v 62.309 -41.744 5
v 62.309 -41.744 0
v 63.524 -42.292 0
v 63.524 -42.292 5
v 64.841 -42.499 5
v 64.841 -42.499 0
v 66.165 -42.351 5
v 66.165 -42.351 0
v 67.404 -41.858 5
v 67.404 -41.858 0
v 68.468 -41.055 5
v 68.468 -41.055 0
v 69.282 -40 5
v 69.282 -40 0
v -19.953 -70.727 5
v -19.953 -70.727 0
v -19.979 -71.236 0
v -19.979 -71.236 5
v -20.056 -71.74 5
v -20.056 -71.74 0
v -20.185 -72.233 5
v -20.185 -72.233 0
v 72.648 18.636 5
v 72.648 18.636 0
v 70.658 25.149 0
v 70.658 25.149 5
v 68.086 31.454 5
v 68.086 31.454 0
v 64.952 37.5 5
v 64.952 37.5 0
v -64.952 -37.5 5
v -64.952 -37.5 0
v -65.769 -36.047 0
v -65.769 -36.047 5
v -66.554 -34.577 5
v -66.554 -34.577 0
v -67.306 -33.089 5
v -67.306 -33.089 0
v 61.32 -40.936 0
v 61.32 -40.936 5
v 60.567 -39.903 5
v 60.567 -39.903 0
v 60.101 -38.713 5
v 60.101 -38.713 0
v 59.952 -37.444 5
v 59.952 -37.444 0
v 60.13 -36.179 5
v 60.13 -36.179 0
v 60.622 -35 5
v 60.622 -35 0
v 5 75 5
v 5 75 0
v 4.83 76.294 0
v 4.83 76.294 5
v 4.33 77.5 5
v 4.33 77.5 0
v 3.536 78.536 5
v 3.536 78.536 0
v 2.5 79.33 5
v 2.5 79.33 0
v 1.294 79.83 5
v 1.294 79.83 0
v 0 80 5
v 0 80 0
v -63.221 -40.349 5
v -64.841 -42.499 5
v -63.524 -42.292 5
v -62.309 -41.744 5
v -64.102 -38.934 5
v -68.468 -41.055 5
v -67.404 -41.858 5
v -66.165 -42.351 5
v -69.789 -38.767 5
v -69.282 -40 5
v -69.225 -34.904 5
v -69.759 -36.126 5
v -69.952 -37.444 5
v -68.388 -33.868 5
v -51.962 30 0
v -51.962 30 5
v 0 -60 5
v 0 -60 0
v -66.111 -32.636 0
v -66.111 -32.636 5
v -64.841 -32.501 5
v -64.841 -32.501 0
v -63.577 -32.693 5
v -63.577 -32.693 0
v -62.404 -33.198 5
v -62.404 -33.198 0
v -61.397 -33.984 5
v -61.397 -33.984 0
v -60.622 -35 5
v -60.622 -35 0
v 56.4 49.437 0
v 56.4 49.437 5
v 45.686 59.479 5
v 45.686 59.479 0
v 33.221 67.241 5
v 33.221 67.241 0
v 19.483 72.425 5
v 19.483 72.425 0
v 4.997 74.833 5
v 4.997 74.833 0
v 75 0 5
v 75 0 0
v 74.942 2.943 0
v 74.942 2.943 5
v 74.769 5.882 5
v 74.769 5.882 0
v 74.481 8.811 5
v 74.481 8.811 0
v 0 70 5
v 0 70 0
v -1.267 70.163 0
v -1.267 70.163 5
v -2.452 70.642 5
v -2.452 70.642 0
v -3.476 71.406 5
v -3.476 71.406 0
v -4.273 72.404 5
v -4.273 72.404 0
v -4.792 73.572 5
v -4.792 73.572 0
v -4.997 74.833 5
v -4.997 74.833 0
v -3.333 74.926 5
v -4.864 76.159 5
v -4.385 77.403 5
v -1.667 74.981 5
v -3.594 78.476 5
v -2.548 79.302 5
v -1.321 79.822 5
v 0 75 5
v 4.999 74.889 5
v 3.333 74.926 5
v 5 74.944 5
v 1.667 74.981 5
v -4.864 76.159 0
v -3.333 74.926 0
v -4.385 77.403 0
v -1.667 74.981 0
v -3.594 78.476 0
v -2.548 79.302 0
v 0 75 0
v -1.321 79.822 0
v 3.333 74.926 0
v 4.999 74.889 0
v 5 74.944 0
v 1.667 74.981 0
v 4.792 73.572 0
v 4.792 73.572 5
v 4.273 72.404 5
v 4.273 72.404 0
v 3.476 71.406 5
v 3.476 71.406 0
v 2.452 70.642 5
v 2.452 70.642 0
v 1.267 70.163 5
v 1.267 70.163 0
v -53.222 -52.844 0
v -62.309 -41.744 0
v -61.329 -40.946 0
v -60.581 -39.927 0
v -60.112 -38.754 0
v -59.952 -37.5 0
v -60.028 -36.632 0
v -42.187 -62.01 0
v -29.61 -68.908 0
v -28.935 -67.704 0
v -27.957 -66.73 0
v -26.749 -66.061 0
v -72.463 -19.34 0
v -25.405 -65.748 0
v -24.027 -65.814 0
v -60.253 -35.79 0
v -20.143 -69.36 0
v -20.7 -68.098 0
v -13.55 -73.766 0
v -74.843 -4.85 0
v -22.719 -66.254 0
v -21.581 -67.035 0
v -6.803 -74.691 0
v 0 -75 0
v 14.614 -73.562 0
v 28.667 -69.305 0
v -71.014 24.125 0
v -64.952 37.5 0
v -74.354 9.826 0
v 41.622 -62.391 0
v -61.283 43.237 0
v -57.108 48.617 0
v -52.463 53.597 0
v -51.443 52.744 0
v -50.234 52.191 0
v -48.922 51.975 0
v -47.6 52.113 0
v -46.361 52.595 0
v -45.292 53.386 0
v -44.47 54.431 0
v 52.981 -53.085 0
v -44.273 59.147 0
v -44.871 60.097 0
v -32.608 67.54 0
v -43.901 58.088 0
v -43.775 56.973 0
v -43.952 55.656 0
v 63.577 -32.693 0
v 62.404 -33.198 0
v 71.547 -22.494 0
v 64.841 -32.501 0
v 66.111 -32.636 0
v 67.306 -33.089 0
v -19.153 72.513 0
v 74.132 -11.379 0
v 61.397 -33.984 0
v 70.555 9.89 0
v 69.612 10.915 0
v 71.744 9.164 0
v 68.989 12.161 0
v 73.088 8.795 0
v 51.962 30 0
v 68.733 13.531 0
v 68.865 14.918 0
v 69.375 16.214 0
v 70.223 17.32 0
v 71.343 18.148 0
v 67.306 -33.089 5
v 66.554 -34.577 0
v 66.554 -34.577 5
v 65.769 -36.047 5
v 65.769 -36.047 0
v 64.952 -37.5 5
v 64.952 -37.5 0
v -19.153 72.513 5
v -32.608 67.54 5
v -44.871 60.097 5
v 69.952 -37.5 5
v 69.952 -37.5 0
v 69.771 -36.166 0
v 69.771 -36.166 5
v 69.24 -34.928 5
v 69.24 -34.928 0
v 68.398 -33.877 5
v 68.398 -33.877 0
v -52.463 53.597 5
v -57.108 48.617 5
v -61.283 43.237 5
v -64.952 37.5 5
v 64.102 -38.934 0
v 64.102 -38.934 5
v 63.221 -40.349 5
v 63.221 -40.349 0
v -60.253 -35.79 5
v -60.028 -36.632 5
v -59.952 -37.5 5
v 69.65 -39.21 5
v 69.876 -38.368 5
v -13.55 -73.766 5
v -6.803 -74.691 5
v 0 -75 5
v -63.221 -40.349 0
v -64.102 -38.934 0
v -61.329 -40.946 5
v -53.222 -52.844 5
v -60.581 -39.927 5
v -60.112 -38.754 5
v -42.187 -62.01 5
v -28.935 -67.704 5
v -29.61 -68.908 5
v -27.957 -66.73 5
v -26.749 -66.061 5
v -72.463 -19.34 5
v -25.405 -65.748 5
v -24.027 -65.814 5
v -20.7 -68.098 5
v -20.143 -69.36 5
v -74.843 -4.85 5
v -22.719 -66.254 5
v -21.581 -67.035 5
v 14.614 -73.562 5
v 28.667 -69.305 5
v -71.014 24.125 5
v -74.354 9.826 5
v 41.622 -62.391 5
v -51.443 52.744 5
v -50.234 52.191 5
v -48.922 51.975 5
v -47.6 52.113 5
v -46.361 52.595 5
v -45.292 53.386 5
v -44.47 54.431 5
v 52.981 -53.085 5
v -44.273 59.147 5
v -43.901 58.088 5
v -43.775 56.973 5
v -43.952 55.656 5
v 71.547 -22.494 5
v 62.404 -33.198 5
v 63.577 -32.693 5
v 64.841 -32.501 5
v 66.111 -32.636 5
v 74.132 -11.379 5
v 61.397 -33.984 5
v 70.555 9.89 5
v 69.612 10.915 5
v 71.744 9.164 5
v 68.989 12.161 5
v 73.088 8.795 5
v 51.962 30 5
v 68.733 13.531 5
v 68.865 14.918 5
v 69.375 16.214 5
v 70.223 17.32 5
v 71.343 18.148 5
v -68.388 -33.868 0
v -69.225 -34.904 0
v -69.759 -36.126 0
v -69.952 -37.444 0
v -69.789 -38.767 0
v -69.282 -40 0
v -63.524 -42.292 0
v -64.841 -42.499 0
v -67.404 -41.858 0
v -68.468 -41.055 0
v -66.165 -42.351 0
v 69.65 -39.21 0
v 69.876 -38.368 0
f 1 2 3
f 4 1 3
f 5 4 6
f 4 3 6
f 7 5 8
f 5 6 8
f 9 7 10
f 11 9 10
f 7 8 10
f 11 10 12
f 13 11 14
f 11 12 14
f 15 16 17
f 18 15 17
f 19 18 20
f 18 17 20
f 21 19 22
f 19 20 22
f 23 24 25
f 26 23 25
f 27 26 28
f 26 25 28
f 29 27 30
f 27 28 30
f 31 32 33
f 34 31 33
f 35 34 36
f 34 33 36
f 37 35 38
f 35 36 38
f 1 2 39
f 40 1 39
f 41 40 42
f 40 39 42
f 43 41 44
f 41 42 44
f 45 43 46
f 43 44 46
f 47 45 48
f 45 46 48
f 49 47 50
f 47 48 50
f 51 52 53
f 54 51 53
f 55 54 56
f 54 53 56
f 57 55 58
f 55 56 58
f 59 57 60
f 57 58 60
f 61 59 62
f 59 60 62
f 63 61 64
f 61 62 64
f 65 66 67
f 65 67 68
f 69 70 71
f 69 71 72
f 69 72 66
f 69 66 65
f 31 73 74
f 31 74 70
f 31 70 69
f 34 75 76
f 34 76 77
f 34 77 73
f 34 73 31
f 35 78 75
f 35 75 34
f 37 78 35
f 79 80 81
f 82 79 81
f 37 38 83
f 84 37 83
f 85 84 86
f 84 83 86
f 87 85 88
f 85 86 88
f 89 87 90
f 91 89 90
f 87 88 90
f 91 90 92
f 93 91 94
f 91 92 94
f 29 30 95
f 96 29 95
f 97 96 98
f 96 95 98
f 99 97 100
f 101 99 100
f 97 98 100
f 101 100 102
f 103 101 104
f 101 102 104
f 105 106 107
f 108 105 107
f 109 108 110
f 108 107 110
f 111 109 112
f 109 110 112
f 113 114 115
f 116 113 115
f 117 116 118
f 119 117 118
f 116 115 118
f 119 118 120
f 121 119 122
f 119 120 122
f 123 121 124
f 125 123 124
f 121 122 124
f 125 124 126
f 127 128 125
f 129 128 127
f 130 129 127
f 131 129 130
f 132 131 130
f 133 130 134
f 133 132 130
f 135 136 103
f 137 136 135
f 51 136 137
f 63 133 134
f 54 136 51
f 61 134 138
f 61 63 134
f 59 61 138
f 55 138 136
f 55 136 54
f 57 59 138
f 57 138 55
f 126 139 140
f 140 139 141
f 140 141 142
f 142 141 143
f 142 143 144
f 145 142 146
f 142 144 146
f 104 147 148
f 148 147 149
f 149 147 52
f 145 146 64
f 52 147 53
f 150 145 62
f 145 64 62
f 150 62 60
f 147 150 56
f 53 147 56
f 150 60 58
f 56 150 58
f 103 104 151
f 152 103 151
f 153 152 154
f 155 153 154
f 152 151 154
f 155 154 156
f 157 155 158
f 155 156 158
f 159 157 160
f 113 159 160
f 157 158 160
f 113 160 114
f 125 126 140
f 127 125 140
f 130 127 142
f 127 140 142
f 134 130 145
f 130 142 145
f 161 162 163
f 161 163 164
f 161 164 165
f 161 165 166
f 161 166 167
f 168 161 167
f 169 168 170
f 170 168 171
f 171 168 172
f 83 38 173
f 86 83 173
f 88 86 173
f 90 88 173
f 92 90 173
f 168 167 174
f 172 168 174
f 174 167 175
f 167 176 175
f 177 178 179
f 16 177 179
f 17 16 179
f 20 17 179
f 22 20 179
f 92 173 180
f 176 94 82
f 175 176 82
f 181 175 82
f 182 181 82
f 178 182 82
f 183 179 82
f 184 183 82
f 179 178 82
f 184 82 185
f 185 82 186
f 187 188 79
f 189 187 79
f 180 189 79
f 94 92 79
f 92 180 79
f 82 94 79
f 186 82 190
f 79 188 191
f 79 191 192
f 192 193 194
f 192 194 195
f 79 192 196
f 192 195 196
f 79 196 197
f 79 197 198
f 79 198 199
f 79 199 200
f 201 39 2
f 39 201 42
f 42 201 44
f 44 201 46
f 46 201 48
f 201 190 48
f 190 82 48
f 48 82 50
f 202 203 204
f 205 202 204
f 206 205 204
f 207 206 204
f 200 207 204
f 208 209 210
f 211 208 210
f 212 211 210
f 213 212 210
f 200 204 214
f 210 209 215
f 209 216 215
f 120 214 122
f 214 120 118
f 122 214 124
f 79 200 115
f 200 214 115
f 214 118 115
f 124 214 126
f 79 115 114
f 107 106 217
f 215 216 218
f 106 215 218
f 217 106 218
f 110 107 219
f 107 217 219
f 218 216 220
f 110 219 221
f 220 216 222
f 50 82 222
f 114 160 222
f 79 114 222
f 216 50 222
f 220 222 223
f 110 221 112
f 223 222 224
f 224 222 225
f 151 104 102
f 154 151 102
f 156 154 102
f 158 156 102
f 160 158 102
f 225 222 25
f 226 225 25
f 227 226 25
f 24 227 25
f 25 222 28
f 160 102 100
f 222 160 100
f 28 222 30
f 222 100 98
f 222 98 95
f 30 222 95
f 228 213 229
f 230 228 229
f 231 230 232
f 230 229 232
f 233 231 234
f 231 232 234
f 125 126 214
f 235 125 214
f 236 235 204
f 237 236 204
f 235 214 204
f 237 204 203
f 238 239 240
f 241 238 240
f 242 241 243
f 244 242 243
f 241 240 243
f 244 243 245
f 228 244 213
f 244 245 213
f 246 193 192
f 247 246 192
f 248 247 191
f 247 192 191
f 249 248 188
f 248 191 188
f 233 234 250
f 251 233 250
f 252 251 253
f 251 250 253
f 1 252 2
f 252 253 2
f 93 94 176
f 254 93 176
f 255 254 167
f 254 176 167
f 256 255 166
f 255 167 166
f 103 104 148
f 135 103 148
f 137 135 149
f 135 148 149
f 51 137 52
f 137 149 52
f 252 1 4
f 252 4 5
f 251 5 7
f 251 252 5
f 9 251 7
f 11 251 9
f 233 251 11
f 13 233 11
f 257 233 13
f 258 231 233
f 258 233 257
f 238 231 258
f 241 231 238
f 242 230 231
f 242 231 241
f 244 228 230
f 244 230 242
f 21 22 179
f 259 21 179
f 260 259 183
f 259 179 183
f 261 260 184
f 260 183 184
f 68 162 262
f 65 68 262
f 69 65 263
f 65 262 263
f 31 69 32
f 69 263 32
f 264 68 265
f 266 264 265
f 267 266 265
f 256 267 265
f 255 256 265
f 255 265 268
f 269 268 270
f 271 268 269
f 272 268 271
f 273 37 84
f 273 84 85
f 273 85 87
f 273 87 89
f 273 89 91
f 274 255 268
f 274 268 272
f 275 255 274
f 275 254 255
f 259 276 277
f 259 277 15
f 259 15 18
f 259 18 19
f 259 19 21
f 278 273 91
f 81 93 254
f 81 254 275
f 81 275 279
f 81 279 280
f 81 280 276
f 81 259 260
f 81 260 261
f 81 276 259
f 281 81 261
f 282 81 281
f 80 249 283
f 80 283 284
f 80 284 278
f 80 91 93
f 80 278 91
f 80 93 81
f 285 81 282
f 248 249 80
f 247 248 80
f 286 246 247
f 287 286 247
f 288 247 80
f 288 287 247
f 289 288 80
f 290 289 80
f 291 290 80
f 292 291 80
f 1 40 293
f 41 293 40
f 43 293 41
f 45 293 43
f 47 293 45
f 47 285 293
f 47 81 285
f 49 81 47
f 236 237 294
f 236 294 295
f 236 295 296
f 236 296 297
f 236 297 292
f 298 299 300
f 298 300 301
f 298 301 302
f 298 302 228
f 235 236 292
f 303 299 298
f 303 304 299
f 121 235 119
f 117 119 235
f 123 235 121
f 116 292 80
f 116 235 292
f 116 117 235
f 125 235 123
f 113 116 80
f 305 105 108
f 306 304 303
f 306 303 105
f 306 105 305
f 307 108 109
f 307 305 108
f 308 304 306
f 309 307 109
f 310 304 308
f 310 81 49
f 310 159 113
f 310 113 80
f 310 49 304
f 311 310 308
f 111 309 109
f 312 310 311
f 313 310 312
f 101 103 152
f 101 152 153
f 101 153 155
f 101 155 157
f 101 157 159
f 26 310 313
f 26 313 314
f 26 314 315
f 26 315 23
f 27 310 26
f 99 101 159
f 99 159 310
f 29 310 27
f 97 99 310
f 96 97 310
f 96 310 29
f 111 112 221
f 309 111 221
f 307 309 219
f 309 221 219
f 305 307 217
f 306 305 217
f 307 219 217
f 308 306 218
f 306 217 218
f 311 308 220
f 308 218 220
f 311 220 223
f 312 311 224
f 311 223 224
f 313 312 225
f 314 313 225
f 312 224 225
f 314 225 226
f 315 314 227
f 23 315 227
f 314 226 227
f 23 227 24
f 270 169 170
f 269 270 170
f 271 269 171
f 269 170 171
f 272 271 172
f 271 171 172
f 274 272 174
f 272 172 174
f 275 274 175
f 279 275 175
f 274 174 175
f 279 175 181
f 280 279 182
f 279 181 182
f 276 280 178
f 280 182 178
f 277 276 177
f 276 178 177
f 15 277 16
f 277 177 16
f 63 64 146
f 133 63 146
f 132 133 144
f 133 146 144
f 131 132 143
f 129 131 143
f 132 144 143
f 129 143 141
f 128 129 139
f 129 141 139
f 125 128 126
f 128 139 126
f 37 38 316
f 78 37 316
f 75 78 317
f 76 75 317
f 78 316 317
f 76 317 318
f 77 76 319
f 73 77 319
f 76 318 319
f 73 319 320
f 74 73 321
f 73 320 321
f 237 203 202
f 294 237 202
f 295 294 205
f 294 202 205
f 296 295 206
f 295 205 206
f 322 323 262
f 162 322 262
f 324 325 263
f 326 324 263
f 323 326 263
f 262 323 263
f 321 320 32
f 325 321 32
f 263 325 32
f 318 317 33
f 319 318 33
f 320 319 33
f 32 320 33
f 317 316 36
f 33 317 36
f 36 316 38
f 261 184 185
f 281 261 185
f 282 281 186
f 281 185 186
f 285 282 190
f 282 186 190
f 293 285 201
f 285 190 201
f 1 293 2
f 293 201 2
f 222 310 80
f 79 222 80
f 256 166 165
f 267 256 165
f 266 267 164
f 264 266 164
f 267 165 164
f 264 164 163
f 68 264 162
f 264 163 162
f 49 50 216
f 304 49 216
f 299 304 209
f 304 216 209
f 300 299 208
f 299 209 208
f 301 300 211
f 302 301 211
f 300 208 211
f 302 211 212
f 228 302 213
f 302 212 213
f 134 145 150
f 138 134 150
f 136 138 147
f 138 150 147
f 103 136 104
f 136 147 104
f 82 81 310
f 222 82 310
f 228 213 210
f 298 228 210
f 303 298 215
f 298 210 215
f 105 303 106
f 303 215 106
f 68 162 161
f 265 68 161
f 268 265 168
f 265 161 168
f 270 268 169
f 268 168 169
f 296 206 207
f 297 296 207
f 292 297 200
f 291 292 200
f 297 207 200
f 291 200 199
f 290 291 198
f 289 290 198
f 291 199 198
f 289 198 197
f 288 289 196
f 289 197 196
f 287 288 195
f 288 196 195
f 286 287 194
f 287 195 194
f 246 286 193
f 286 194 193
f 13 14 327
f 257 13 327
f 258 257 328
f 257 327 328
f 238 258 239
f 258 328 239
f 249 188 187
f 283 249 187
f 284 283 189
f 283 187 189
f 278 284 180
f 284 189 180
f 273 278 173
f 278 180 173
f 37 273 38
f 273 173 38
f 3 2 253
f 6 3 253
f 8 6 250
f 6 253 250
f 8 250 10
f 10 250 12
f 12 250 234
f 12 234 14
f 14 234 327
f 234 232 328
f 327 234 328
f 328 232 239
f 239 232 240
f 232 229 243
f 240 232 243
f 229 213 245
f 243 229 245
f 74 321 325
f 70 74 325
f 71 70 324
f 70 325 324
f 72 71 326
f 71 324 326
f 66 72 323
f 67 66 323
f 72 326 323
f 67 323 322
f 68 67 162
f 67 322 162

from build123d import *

# Parameters (mm, degrees)
F1_DEPTH = 5
F3_DEPTH = 25


with BuildPart() as f1:
    # F0 (on Top) → F1 (new body)
    with BuildSketch(Plane.XY):
        with BuildLine():
            Line((-60.6217782649, -35), (0, 0))
            Line((0, 0), (0, 70))
            ThreePointArc((0, 70), (-3.4761089358, 71.4060235579), (-4.9972214502, 74.8333333333))
            ThreePointArc((-4.9972214502, 74.8333333333), (-26, 70.3491293478), (-44.8708950659, 60.0966120175))
            ThreePointArc((-44.8708950659, 60.0966120175), (-44.0572130953, 58.6282492814), (-43.7753963478, 56.9733333333))
            ThreePointArc((-43.7753963478, 56.9733333333), (-46.964127278, 52.3129358871), (-52.4631180905, 53.5968398343))
            ThreePointArc((-52.4631180905, 53.5968398343), (-59.2566382592, 45.9744583678), (-64.9519078458, 37.4999955625))
            ThreePointArc((-64.9519078458, 37.4999955625), (-74.9583218382, 2.4999974394), (-67.3061784416, -33.0889459425))
            ThreePointArc((-67.3061784416, -33.0889459425), (-63.5774848522, -32.6926131342), (-60.6217782649, -35))
        make_face()
        with BuildLine():
            ThreePointArc((62.3089569914, -41.7443873909), (60.1013759165, -38.7134104236), (60.6217782649, -35))
            Line((60.6217782649, -35), (0, 0))
            Line((0, 0), (-60.6217782649, -35))
            ThreePointArc((-60.6217782649, -35), (-60.1222761524, -36.2059047745), (-59.9519052838, -37.5))
            ThreePointArc((-59.9519052838, -37.5), (-60.5807074239, -39.9274738452), (-62.3089569914, -41.7443873909))
            ThreePointArc((-62.3089569914, -41.7443873909), (-47.9241331494, -57.6912251723), (-29.6097451556, -68.9076410264))
            ThreePointArc((-29.6097451556, -68.9076410264), (-24.0267634569, -65.8138744531), (-19.952655831, -70.7273989836))
            ThreePointArc((-19.952655831, -70.7273989836), (-20.010998716, -71.4889926791), (-20.1846658138, -72.2328129452))
            ThreePointArc((-20.1846658138, -72.2328129452), (-10.186732339, -74.3049829033), (-1.182e-07, -75))
            ThreePointArc((-1.182e-07, -75), (35.3140973148, -66.1658108908), (62.3089569914, -41.7443873909))
        make_face()
        with BuildLine():
            ThreePointArc((67.3061784416, -33.0889459425), (73.0512264891, -16.9858266928), (75, 0))
            ThreePointArc((75, 0), (74.870047471, 4.4131611905), (74.4806402215, 8.8110290088))
            ThreePointArc((74.4806402215, 8.8110290088), (68.8128487003, 12.8371279402), (72.6477839043, 18.6359731109))
            ThreePointArc((72.6477839043, 18.6359731109), (69.4433694571, 28.3305213232), (64.9519065756, 37.4999977625))
            ThreePointArc((64.9519065756, 37.4999977625), (39.6442254825, 63.6658101802), (4.9972214502, 74.8333333333))
            ThreePointArc((4.9972214502, 74.8333333333), (3.4761089358, 71.4060235579), (0, 70))
            Line((0, 70), (0, 0))
            Line((0, 0), (60.6217782649, -35))
            ThreePointArc((60.6217782649, -35), (63.5774848522, -32.6926131342), (67.3061784416, -33.0889459425))
        make_face()
    extrude(amount=F1_DEPTH)

    # F2 (on face) → F3 (cut)
    with BuildSketch(Plane.XY.offset(5)):
        Polygon((51.9615242271, 30), (-51.9615242271, 30), (0, -60), align=None)
    extrude(amount=-F3_DEPTH, mode=Mode.SUBTRACT)


with BuildPart() as f1b:
    # F0 (on Top) → F1, piece 2 (new body)
    with BuildSketch(Plane.XY):
        with BuildLine():
            ThreePointArc((0, 75), (2.5, 74.9583217528), (4.9972214502, 74.8333333333))
            ThreePointArc((4.9972214502, 74.8333333333), (4.9993053143, 74.916655087), (5, 75))
            ThreePointArc((5, 75), (3.5355339059, 78.5355339059), (0, 80))
            Line((0, 80), (0, 75))
        make_face()
        with BuildLine():
            ThreePointArc((-4.9972214502, 74.8333333333), (-2.5, 74.9583217528), (0, 75))
            Line((0, 75), (0, 80))
            ThreePointArc((0, 80), (-3.5939764421, 78.4761089358), (-4.9972214502, 74.8333333333))
        make_face()
    extrude(amount=F1_DEPTH)


with BuildPart() as f1c:
    # F0 (on Top) → F1, piece 3 (new body)
    with BuildSketch(Plane.XY):
        with BuildLine():
            ThreePointArc((-62.3089569914, -41.7443873909), (-63.665810863, -39.6442243859), (-64.9519052838, -37.5))
            Line((-64.9519052838, -37.5), (-69.2820323028, -40))
            ThreePointArc((-69.2820323028, -40), (-66.1653157075, -42.3505293674), (-62.3089569914, -41.7443873909))
        make_face()
        with BuildLine():
            Line((-69.2820323028, -40), (-64.9519052838, -37.5))
            ThreePointArc((-64.9519052838, -37.5), (-66.165810863, -35.314097367), (-67.3061784416, -33.0889459425))
            ThreePointArc((-67.3061784416, -33.0889459425), (-69.7592921496, -36.1255795684), (-69.2820323028, -40))
        make_face()
    extrude(amount=F1_DEPTH)


with BuildPart() as f1d:
    # F0 (on Top) → F1, piece 4 (new body)
    with BuildSketch(Plane.XY):
        with BuildLine():
            Line((69.2820323028, -40), (64.9519052838, -37.5))
            ThreePointArc((64.9519052838, -37.5), (63.665810863, -39.6442243859), (62.3089569914, -41.7443873909))
            ThreePointArc((62.3089569914, -41.7443873909), (66.1653157075, -42.3505293674), (69.2820323028, -40))
        make_face()
        with BuildLine():
            ThreePointArc((69.9519052838, -37.5), (69.2397582308, -34.9281685309), (67.3061784416, -33.0889459425))
            ThreePointArc((67.3061784416, -33.0889459425), (66.165810863, -35.314097367), (64.9519052838, -37.5))
            Line((64.9519052838, -37.5), (69.2820323028, -40))
            ThreePointArc((69.2820323028, -40), (69.7815344153, -38.7940952255), (69.9519052838, -37.5))
        make_face()
    extrude(amount=F1_DEPTH)


solid = Compound([f1.part, f1b.part, f1c.part, f1d.part])
